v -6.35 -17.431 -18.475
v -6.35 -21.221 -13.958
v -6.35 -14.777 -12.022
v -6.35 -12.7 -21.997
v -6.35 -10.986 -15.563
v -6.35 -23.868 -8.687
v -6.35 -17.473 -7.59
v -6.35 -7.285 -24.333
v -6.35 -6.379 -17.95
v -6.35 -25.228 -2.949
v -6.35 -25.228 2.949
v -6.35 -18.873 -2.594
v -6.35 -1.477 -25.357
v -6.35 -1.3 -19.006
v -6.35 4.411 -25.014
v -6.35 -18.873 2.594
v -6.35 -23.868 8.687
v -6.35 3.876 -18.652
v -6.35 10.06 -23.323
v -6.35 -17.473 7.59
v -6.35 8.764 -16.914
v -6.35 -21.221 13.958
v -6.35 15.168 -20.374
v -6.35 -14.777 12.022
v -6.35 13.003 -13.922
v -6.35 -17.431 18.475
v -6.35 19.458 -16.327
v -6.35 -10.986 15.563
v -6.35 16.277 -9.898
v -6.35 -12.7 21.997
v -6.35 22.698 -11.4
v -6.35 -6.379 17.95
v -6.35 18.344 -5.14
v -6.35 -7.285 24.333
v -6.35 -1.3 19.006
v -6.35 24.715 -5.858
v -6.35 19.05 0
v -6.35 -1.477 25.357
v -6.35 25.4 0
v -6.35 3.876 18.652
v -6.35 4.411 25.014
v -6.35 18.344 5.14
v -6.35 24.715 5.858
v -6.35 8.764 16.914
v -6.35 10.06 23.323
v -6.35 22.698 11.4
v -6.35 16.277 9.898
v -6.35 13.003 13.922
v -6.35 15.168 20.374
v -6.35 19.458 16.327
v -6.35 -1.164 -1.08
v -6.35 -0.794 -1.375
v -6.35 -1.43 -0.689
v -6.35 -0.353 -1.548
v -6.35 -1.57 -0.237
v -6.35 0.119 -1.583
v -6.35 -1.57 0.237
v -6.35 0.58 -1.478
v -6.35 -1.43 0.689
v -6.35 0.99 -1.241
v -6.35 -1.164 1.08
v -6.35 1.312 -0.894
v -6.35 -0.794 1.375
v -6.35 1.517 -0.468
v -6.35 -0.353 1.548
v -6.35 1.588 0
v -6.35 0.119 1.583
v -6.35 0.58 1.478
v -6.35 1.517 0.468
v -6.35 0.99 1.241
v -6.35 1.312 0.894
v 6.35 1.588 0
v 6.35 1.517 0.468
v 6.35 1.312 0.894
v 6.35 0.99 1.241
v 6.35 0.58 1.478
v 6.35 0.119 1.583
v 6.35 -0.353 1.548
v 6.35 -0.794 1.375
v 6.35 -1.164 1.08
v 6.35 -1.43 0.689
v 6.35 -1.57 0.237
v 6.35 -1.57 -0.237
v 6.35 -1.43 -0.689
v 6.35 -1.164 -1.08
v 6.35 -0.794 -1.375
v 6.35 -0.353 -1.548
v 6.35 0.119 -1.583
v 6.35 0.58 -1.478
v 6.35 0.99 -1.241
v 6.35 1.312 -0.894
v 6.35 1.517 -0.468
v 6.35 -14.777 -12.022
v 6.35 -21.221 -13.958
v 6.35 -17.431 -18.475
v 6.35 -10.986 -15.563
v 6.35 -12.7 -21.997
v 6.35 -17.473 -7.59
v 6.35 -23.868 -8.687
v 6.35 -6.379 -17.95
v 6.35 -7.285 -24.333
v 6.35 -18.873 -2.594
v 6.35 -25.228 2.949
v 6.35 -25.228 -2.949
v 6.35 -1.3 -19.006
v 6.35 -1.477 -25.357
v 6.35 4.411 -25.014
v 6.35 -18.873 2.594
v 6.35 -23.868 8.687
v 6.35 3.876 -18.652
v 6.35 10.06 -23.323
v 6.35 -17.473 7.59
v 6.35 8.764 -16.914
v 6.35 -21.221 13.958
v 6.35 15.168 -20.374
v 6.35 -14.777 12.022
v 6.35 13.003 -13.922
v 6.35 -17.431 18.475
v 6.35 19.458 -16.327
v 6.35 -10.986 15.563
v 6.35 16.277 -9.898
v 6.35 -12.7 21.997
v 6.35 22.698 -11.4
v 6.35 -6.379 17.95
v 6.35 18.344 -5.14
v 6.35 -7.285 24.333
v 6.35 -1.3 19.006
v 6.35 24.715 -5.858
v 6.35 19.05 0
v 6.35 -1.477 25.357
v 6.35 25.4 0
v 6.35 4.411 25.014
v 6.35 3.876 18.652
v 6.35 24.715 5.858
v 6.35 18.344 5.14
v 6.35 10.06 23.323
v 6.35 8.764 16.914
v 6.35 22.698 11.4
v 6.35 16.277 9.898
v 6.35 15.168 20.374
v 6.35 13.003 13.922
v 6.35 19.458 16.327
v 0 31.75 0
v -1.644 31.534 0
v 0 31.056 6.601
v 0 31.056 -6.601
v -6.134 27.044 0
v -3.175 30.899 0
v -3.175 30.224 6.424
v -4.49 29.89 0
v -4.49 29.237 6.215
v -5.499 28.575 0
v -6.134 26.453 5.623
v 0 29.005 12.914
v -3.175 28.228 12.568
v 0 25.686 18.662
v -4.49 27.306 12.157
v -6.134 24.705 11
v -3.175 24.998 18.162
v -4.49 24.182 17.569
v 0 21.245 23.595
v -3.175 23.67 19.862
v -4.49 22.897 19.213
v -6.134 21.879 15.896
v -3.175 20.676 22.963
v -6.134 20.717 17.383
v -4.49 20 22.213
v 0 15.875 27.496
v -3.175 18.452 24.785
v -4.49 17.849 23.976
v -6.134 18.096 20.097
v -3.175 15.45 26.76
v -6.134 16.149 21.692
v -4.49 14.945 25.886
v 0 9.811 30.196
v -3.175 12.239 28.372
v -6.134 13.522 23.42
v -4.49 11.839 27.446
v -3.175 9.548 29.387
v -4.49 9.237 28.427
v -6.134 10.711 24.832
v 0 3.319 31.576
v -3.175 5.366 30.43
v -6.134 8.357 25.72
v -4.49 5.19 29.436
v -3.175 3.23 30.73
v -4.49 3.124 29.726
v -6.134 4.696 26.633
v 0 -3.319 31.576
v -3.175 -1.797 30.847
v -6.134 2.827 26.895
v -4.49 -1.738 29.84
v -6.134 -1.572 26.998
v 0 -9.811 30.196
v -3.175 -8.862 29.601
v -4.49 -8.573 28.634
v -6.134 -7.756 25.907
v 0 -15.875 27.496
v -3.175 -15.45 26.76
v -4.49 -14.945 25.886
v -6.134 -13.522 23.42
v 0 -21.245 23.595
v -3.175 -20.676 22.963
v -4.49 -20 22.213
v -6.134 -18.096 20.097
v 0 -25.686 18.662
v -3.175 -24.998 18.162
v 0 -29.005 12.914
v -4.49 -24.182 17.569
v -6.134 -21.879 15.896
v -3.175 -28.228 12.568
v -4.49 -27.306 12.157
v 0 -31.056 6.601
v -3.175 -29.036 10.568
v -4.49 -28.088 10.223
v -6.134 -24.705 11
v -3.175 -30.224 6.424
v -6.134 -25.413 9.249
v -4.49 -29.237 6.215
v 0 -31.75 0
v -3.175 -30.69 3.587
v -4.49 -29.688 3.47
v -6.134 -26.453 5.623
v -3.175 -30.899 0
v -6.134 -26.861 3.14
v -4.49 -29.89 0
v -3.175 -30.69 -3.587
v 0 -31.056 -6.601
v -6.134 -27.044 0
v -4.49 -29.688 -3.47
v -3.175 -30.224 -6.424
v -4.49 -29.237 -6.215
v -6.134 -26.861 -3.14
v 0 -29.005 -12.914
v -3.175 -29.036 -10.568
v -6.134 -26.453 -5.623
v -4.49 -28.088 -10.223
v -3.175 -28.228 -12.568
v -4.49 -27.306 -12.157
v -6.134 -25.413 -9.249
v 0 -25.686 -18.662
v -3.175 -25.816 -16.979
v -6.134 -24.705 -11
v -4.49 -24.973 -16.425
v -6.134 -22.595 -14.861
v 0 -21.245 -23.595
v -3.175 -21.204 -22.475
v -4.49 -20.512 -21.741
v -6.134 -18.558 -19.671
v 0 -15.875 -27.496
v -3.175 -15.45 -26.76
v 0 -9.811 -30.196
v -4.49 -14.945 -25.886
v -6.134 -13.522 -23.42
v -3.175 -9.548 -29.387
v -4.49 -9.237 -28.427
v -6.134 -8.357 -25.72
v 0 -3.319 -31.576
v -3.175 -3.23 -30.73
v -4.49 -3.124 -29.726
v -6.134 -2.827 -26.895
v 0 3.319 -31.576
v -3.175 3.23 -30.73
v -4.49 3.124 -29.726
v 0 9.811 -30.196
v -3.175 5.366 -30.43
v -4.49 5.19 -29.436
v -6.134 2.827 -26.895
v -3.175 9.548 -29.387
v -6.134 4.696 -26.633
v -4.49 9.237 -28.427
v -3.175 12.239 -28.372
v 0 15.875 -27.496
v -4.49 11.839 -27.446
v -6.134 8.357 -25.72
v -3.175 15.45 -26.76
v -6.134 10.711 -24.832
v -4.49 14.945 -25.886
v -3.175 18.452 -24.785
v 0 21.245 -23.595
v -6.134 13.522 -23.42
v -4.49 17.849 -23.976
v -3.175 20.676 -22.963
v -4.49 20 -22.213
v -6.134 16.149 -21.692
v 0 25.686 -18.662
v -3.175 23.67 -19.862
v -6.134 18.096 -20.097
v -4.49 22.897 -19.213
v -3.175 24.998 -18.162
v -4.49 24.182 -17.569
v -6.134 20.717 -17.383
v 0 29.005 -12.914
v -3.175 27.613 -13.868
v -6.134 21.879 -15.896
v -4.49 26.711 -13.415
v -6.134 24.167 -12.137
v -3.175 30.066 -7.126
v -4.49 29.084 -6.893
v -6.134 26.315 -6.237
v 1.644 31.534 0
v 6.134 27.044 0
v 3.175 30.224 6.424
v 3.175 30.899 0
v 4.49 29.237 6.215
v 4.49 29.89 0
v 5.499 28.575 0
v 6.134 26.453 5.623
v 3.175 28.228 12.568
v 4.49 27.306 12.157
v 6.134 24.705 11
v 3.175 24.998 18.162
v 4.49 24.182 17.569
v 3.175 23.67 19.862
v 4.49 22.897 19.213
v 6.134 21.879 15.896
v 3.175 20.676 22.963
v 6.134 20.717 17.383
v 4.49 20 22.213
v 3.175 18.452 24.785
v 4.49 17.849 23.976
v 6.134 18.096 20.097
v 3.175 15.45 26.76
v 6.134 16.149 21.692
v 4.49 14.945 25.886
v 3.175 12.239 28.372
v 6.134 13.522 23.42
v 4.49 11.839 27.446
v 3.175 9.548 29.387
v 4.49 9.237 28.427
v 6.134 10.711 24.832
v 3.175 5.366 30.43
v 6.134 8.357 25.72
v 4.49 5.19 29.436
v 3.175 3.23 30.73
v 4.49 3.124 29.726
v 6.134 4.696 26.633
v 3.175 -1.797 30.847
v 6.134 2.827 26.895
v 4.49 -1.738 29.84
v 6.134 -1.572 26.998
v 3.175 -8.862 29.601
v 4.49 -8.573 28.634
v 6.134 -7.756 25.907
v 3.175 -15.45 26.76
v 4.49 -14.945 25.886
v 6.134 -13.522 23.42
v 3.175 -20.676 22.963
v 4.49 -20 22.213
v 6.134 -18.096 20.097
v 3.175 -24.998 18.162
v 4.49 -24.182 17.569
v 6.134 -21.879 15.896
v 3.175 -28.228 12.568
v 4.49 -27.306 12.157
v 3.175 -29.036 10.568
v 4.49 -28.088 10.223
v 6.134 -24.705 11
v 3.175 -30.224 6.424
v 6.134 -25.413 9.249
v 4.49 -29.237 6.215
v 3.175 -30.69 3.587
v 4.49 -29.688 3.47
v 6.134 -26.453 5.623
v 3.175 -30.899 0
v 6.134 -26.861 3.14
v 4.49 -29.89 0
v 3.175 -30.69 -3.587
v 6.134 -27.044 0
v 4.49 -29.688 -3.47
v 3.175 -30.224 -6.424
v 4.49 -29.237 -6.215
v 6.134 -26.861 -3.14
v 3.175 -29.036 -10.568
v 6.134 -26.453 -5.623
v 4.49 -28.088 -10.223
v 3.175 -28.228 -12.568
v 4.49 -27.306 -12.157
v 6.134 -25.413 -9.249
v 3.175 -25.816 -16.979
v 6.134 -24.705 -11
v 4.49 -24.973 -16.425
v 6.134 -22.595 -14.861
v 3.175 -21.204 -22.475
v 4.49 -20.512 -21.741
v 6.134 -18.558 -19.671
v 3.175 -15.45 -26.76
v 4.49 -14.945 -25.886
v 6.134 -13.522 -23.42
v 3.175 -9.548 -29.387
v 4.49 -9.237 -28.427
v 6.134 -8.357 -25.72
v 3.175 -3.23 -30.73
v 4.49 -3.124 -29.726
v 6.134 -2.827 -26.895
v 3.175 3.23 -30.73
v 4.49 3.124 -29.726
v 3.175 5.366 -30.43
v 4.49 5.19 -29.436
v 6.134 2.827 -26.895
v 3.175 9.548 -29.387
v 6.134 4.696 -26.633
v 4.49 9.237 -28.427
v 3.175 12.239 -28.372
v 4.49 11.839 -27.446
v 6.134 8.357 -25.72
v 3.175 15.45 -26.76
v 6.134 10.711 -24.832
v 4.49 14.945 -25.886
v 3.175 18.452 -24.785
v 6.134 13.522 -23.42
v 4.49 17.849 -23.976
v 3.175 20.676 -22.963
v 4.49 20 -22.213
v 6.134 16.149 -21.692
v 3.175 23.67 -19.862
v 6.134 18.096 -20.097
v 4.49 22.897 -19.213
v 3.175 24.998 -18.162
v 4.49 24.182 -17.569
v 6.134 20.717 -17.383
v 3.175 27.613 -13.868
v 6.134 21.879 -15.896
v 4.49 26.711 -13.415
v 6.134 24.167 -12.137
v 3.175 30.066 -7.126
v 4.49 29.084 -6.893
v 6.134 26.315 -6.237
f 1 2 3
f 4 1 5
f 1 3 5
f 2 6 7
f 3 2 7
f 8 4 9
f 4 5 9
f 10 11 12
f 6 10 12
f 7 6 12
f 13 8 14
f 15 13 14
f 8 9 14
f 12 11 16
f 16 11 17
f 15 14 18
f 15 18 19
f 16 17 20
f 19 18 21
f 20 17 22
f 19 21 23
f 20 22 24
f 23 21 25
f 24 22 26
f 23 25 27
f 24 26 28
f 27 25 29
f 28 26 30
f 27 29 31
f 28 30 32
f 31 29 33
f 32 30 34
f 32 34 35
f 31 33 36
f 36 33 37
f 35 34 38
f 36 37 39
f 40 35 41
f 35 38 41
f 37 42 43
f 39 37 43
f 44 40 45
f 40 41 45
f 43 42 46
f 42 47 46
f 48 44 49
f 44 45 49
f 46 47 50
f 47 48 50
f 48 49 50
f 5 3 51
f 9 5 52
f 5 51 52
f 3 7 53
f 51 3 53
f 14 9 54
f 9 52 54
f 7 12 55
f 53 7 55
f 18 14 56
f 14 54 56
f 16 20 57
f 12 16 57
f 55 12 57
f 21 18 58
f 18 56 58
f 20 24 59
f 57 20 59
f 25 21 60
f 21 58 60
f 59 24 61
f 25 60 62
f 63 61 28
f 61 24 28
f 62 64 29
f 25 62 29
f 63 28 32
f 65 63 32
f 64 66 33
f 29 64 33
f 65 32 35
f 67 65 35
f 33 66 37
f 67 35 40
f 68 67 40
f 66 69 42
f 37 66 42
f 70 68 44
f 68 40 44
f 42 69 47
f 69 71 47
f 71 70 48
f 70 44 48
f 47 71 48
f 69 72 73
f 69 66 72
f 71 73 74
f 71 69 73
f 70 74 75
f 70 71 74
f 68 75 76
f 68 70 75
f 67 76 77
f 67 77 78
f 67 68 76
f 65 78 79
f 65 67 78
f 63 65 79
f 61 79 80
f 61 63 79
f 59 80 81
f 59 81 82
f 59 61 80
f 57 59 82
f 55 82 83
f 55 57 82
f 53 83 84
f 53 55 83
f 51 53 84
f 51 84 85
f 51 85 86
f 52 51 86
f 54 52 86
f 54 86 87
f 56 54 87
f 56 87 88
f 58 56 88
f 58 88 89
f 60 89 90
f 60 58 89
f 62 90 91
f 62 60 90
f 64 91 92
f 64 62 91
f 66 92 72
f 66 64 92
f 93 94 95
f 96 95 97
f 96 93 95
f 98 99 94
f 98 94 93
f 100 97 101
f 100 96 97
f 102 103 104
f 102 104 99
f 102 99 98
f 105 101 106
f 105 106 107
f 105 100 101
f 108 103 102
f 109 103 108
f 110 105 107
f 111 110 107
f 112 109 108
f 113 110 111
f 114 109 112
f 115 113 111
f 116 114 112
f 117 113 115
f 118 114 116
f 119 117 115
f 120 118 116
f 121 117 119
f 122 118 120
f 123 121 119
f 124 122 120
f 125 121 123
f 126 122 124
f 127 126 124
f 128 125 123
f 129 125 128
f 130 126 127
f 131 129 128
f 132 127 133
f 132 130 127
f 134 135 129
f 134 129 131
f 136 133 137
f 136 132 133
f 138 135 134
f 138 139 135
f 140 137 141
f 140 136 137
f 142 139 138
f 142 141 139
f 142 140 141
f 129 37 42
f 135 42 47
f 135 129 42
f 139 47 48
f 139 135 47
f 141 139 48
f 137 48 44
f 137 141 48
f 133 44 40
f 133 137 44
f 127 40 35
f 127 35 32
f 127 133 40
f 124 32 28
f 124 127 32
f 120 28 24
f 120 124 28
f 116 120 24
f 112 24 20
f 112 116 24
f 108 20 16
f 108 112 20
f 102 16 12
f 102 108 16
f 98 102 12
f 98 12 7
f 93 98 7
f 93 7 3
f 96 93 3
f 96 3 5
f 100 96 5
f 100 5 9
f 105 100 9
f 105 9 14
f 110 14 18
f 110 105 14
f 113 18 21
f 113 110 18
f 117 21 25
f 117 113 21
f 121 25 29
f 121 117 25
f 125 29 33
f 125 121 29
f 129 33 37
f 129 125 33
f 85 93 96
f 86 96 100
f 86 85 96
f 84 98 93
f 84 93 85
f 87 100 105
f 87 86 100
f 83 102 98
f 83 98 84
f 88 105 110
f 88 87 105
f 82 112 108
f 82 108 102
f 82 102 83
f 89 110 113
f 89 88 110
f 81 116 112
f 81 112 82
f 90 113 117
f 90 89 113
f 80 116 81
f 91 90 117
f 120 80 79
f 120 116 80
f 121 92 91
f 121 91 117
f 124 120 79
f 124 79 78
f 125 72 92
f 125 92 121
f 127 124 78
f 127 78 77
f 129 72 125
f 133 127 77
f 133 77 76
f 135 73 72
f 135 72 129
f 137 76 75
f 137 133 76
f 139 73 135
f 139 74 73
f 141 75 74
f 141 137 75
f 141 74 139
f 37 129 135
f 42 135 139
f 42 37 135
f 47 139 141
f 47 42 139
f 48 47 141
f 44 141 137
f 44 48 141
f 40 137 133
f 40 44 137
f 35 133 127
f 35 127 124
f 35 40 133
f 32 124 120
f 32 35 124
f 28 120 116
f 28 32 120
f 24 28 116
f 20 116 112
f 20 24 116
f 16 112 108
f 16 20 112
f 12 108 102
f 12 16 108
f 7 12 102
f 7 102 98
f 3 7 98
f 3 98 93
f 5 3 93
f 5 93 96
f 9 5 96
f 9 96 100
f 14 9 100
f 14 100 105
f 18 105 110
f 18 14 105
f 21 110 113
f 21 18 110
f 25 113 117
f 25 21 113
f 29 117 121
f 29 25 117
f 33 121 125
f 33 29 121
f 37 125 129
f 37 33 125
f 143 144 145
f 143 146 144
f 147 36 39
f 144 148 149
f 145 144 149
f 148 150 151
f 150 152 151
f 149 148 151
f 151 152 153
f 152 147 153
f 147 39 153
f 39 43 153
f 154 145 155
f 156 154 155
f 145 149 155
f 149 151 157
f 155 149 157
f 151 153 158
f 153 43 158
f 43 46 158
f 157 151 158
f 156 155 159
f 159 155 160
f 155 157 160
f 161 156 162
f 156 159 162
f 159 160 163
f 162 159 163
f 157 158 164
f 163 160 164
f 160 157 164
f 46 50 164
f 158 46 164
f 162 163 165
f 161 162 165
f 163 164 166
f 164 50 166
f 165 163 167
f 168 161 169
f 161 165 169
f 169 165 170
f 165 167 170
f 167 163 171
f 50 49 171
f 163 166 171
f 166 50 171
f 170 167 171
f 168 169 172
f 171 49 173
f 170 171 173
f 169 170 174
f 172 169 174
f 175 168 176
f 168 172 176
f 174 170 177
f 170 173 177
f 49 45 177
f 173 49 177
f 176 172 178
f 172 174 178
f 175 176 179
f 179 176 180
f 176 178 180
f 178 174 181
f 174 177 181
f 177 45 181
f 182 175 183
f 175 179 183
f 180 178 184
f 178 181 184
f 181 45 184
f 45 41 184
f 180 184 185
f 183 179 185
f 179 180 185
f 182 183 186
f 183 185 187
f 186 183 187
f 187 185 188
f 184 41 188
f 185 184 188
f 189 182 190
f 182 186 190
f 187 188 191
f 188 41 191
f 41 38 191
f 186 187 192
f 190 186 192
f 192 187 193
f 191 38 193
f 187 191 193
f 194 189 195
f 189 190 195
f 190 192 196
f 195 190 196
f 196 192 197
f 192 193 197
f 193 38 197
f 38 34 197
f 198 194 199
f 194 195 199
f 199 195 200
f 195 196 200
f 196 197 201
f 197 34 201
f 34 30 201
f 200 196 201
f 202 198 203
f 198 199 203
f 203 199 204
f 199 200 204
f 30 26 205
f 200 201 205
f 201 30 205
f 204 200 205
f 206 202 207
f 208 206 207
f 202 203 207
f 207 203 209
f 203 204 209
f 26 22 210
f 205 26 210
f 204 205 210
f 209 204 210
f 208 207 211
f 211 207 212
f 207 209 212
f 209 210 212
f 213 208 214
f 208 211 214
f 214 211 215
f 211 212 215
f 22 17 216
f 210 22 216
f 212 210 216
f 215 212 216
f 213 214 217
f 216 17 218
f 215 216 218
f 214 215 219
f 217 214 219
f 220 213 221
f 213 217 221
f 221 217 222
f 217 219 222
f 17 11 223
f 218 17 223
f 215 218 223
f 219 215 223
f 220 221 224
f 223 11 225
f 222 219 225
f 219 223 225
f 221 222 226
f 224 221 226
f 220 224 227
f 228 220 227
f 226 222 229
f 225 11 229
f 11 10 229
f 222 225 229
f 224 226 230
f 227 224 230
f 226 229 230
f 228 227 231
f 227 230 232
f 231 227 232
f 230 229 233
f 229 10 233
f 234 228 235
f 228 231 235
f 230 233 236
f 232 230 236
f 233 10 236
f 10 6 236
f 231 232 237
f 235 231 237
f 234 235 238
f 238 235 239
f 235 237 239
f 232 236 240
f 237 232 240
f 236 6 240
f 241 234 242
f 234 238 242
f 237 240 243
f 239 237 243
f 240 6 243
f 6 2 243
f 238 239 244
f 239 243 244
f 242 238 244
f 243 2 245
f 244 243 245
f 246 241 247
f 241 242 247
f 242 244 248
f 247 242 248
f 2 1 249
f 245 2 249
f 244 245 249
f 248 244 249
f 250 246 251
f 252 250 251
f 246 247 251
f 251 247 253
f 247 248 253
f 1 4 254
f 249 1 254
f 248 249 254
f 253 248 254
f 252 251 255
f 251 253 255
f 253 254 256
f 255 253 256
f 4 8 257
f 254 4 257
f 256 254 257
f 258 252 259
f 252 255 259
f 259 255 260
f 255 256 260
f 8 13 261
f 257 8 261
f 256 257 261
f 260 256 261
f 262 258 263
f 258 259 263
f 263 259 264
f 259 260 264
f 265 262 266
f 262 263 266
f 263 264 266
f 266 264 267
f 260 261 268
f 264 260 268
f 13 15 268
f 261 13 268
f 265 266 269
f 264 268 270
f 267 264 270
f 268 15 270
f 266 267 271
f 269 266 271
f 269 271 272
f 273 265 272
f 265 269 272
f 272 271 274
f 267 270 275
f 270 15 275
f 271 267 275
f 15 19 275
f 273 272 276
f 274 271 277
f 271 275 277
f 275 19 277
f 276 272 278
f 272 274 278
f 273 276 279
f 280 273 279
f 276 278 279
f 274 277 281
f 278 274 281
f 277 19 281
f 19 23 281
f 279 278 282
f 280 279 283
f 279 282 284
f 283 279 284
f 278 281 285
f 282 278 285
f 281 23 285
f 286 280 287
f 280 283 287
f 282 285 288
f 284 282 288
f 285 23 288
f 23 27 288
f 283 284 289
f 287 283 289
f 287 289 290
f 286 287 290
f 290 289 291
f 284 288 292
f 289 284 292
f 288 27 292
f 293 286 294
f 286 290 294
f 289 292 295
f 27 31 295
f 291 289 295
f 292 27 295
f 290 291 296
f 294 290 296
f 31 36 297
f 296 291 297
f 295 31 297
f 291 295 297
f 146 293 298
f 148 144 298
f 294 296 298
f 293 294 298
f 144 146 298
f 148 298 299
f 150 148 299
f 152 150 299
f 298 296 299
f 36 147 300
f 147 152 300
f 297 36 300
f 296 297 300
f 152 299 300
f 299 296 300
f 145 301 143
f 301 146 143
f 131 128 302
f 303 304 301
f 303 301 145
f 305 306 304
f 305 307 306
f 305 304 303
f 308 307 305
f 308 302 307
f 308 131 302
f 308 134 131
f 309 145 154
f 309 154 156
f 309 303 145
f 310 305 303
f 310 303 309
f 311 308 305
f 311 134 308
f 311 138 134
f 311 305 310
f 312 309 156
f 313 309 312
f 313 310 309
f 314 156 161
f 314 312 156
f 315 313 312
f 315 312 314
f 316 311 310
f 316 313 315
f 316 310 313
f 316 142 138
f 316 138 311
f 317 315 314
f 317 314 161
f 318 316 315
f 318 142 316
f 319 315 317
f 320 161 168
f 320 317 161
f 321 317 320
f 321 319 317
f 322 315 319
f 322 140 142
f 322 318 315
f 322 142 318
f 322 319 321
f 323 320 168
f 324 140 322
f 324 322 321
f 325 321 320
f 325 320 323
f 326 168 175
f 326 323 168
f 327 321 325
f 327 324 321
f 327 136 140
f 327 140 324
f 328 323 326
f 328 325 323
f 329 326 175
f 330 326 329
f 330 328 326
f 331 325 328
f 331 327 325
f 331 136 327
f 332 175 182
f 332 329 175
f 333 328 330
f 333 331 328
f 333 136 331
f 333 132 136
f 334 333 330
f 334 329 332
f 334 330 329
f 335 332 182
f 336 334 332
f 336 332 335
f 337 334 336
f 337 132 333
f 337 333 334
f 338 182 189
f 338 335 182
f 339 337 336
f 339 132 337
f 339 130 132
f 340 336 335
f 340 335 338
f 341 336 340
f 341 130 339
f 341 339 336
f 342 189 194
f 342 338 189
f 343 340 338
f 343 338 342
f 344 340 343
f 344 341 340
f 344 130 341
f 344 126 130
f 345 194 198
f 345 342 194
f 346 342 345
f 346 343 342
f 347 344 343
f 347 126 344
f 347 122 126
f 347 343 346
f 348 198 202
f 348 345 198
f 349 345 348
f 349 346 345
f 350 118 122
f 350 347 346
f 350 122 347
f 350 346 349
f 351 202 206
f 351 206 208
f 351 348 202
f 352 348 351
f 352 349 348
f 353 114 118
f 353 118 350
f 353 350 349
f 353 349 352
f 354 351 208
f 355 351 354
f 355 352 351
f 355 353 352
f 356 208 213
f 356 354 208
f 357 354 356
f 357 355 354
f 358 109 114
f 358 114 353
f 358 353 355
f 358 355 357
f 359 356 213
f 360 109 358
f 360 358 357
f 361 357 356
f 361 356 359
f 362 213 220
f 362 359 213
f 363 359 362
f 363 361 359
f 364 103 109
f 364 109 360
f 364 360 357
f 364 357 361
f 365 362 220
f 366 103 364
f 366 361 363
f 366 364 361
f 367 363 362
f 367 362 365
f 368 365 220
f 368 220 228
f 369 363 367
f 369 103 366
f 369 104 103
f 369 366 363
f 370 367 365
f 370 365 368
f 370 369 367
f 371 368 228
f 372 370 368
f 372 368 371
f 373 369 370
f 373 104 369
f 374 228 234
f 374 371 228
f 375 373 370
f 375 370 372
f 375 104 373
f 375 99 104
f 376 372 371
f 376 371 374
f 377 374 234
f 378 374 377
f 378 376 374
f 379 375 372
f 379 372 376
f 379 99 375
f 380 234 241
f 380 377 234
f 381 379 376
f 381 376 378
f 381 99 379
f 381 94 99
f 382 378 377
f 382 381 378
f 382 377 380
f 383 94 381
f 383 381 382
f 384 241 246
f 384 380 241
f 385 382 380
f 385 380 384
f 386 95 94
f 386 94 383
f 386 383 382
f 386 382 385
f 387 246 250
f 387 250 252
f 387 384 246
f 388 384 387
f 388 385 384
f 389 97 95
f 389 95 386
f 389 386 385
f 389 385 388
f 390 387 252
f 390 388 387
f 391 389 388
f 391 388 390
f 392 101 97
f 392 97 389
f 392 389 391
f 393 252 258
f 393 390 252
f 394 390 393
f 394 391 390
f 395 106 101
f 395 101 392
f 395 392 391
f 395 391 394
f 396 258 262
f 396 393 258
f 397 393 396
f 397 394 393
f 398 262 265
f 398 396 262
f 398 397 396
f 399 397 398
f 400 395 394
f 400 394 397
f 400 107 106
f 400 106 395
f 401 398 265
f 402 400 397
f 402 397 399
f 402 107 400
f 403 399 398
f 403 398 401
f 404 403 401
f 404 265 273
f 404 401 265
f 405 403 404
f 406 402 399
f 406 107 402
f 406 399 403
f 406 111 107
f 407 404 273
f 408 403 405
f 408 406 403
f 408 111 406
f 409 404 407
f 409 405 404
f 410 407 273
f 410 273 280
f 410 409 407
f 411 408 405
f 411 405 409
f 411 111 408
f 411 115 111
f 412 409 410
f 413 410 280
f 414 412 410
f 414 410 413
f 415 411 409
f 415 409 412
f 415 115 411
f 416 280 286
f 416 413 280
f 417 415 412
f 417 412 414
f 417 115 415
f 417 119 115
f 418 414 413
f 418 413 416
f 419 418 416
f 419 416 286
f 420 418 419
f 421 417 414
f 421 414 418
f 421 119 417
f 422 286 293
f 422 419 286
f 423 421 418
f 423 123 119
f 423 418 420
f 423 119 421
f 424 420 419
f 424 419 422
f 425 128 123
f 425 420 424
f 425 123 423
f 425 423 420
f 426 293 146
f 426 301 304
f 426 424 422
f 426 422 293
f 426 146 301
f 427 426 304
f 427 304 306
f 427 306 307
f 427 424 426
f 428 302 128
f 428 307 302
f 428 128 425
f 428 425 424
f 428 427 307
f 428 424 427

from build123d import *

# Parameters (mm, degrees)
F0_R     = 19.05
F0_R_2   = 1.5875
F1_DEPTH = 6.35
F0_R_3   = 31.75
F2_DEPTH = 6.35
F3_R     = 6.34999


# Not quite as in the source:
# - a fillet or chamfer is up to 0.001 mm smaller than in the source, because OpenCascade refuses the exact size


with BuildPart() as f1:
    # F0 (on Right) → F1 (new body, symmetric)
    with BuildSketch(Plane.YZ):
        Circle(F0_R)
        Circle(F0_R_2, mode=Mode.SUBTRACT)
    extrude(amount=F1_DEPTH, both=True)


with BuildPart() as f2:
    # F0 (on Right) → F2 (new body, symmetric)
    with BuildSketch(Plane.YZ):
        Circle(F0_R_3)
        Circle(F0_R, mode=Mode.SUBTRACT)
    extrude(amount=F2_DEPTH, both=True)

    # F3 (radius 6.35 in the source; OpenCascade refuses exactly that, so slightly less here)
    f3_edges = [f2.edges().sort_by_distance(p)[0] for p in [
        (6.35, -31.75, 0),
        (-6.35, -31.75, 0),
    ]]
    fillet(f3_edges, radius=F3_R)


solid = Compound([f1.part, f2.part])
